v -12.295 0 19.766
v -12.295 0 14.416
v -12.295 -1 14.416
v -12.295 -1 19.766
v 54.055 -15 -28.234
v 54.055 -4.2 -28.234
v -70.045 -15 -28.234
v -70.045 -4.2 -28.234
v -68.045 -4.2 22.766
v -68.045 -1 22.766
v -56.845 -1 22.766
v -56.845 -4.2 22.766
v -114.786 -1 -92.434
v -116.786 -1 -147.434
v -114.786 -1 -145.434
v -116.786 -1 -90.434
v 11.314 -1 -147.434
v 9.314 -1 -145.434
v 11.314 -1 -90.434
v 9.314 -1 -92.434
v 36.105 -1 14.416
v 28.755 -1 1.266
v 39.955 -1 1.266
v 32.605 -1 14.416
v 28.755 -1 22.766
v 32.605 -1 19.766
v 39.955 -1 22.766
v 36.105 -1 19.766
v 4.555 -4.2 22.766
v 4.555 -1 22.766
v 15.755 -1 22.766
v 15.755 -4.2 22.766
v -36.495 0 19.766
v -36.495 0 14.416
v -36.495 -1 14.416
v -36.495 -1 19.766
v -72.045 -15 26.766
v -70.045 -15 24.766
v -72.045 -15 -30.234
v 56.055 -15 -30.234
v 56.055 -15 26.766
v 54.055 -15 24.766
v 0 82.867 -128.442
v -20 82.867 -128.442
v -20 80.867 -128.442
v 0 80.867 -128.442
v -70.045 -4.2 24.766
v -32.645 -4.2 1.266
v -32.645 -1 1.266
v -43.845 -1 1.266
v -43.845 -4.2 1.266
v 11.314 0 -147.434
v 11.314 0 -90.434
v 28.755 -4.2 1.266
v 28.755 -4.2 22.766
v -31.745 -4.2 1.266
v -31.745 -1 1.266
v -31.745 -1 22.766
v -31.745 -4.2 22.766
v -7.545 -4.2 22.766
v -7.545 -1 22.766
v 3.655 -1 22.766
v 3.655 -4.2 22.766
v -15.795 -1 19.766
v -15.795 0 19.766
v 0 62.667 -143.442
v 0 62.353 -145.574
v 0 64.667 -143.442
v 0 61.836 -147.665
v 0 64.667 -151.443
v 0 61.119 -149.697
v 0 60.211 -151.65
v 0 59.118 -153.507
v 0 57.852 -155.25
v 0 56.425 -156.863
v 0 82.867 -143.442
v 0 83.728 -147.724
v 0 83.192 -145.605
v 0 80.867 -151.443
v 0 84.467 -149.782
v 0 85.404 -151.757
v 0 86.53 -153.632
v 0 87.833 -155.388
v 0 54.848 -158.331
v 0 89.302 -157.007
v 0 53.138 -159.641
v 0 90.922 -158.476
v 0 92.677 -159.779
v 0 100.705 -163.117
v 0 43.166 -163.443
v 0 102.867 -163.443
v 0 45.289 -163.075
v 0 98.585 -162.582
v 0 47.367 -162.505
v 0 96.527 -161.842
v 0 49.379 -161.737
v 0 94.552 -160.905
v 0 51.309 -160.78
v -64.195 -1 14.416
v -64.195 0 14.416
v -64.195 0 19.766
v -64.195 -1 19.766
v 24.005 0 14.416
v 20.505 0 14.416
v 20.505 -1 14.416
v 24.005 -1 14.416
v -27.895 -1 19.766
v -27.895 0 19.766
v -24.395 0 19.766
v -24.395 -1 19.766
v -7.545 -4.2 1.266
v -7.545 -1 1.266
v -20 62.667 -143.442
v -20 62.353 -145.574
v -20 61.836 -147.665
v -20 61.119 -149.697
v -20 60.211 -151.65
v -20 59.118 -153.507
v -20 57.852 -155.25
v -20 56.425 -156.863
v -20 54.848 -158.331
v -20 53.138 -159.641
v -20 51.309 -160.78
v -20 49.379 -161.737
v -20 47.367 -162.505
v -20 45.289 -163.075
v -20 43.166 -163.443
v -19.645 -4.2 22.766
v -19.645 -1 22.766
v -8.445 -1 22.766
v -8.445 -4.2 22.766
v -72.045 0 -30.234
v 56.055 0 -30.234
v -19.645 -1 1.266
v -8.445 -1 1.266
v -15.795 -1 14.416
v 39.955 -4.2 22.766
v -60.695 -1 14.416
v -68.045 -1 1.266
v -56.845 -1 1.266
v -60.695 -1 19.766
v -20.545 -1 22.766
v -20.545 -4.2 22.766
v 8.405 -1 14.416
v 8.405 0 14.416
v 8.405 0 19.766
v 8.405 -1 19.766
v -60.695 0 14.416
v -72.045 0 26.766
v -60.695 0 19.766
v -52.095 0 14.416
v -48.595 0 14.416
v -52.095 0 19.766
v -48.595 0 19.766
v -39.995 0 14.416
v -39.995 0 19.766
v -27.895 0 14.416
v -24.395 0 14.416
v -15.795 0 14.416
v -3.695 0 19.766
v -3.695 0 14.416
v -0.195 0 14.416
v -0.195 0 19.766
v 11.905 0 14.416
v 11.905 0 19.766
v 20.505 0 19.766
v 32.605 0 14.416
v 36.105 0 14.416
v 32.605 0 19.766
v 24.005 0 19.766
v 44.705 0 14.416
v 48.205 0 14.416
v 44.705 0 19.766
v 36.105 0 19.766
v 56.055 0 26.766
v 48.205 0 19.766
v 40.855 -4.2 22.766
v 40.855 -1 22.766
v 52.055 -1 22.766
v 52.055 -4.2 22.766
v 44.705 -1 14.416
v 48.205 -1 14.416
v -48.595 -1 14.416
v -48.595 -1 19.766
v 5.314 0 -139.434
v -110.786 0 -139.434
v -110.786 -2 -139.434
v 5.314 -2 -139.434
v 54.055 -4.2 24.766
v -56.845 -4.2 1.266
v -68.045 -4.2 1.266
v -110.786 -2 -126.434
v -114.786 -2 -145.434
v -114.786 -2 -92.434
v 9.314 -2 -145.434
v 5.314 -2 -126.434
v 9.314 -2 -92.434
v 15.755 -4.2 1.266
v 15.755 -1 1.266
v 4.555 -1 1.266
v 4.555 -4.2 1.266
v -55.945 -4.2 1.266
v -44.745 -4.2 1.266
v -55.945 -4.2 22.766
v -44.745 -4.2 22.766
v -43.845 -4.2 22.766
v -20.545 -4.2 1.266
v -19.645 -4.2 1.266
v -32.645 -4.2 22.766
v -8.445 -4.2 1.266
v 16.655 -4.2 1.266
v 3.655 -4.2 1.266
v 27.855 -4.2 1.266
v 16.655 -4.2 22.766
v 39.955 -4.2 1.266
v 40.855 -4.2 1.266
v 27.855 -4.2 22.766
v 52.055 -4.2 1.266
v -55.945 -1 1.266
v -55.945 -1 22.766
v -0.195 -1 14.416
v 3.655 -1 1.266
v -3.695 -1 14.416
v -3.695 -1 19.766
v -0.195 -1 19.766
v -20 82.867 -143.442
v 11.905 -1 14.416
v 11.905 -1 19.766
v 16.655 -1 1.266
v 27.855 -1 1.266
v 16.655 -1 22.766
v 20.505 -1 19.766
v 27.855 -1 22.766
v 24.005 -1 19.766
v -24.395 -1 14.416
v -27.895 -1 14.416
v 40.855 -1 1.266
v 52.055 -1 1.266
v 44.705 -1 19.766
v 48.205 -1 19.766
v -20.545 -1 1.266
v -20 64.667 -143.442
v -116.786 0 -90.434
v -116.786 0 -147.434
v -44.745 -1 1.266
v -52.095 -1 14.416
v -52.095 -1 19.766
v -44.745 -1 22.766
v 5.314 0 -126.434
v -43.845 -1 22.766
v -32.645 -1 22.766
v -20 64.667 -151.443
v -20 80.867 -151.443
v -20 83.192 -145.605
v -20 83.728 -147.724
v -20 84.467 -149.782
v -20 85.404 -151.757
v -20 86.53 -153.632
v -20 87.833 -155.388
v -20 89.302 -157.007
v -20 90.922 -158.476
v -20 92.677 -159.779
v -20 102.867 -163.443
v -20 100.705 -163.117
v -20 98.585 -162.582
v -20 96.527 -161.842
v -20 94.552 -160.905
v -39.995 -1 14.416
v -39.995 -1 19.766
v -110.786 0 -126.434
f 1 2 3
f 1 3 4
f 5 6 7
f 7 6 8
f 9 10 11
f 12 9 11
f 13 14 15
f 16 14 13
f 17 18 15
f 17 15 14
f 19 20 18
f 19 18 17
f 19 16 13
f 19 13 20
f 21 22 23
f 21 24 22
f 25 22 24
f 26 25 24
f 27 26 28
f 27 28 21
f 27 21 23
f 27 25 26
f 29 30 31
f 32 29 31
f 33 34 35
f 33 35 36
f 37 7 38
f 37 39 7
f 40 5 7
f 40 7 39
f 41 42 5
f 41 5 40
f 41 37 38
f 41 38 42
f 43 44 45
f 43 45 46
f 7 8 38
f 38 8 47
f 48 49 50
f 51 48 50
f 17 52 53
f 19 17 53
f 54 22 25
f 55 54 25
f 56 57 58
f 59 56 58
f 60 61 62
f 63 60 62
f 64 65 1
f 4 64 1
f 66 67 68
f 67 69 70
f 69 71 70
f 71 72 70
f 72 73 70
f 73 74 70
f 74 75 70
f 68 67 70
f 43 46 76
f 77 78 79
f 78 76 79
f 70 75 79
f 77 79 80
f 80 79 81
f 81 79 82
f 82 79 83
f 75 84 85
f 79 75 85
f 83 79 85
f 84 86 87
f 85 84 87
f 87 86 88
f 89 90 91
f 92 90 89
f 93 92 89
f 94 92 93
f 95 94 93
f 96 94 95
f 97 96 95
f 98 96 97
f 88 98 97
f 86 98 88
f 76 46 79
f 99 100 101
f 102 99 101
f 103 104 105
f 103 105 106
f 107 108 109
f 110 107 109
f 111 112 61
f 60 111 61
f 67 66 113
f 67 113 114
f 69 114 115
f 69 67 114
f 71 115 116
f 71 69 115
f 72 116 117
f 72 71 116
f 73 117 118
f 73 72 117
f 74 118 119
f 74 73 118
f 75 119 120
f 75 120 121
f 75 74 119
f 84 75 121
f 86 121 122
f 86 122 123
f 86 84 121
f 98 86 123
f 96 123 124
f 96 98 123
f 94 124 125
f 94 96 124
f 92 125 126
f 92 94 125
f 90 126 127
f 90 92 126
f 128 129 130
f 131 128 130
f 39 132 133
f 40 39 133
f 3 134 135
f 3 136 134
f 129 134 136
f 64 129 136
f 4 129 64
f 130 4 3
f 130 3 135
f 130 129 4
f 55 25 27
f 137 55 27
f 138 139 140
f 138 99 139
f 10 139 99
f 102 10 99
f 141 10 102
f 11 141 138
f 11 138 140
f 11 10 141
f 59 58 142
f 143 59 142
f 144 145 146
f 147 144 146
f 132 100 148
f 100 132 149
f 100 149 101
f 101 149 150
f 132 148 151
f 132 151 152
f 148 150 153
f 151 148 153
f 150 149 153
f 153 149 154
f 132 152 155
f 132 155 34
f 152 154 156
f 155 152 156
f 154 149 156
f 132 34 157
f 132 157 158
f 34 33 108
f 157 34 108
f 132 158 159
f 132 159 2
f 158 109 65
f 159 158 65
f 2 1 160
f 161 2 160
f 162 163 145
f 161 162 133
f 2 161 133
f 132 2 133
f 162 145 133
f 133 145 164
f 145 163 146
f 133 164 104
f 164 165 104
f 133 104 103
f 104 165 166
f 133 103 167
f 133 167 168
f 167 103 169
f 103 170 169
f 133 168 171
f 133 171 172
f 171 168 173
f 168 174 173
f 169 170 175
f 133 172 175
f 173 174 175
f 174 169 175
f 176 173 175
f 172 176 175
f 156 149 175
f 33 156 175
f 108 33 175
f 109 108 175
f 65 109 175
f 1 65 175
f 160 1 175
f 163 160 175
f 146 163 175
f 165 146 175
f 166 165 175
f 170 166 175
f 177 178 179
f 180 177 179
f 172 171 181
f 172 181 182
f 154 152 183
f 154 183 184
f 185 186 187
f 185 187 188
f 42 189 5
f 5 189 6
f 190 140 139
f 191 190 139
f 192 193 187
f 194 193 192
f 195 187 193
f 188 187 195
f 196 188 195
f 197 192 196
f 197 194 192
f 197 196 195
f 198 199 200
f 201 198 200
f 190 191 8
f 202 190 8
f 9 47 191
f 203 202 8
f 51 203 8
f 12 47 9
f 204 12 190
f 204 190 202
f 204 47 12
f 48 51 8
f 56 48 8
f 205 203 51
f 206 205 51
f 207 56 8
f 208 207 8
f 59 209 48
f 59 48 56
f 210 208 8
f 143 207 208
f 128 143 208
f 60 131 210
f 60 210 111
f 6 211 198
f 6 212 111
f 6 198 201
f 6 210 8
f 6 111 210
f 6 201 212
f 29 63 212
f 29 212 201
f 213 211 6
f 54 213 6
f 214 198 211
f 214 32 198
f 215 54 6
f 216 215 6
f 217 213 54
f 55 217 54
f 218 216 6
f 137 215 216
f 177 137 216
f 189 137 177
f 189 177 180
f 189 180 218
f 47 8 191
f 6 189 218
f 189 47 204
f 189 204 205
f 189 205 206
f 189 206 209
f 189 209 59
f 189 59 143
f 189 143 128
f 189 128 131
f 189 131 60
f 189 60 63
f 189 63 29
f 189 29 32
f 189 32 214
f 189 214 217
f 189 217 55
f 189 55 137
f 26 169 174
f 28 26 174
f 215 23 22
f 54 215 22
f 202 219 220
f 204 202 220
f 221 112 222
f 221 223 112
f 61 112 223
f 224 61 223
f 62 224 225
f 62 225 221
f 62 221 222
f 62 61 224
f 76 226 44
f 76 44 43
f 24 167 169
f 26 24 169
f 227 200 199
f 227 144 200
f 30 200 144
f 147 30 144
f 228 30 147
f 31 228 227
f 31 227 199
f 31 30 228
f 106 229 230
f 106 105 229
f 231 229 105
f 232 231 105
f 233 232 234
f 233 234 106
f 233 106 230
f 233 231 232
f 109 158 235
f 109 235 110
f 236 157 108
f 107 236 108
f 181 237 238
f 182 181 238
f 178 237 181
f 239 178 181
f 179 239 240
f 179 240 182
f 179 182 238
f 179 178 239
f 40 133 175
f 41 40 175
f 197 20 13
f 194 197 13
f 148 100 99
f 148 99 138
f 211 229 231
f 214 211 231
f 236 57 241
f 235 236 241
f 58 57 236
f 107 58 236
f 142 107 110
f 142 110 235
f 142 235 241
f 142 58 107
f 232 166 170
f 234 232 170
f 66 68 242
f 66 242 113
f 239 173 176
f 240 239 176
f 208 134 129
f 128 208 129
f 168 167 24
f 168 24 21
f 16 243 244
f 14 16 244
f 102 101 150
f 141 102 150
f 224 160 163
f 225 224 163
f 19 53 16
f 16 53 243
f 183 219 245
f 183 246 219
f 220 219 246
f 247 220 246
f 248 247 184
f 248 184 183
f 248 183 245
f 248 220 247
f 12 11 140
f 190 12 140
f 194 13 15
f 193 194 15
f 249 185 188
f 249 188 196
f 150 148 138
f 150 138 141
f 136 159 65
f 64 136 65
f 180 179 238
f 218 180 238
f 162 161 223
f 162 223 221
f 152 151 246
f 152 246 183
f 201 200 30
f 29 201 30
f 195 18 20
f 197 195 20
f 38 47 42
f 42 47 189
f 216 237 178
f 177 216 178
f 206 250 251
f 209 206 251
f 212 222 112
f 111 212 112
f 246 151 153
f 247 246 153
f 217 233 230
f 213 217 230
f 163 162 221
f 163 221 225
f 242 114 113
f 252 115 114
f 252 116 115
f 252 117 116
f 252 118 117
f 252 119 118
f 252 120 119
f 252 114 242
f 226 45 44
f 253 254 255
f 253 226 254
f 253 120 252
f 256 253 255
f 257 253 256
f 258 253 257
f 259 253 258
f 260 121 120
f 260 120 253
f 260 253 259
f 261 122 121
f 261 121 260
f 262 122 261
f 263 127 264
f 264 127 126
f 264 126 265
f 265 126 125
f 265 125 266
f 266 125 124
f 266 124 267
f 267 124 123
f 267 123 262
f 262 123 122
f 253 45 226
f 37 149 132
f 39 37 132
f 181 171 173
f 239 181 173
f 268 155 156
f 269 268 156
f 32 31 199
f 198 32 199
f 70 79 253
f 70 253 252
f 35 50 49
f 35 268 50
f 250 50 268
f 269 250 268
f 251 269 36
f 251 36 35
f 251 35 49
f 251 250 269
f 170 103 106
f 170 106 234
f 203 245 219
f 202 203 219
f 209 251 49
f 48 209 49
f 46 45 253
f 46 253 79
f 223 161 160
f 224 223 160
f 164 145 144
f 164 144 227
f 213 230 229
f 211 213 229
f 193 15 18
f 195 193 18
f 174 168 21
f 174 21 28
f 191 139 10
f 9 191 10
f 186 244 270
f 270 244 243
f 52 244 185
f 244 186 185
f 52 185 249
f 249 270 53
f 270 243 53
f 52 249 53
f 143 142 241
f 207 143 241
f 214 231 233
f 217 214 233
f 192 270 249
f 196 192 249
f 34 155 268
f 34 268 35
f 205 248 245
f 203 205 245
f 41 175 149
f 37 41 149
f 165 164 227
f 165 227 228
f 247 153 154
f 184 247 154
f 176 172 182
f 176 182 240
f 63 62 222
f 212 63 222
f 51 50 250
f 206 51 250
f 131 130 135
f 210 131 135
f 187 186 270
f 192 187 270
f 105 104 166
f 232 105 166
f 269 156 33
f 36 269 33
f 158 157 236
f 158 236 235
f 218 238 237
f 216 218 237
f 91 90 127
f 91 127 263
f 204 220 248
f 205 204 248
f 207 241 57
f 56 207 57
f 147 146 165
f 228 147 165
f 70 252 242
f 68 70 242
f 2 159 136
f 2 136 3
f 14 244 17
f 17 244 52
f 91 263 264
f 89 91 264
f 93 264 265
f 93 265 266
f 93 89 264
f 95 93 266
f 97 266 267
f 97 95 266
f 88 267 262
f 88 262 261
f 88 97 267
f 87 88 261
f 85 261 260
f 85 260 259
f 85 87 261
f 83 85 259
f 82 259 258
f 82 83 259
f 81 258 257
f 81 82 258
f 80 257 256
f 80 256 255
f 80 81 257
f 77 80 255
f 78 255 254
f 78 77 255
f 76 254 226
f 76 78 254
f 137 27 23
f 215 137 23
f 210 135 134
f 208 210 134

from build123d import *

# Parameters (mm, degrees)
F1_DEPTH  = 15
F2_DEPTH  = 4.2
F0_W      = 3.5
F0_H      = 5.35
F3_DEPTH  = 1
F4_W      = 116.1
F4_H      = 13
F5_DEPTH  = 2
F6_DEPTH  = 1
F8_DEPTH  = 20
F8_FACE_W = 20
F8_FACE_H = 2
F9_DEPTH  = 15


with BuildPart() as f1:
    # F0 (on Front) → F1 (new body)
    with BuildSketch(Plane.XZ):
        Polygon((-70.045013, 26.765566), (-72.045013, 26.765566), (-72.045013, -30.234434), (56.054987, -30.234434), (56.054987, 26.765566), align=None)
        Polygon((-70.045013, -28.234434), (-70.045013, 24.765566), (-68.045013, 24.765566), (54.054987, 24.765566), (54.054987, -28.234434), align=None, mode=Mode.SUBTRACT)
    extrude(amount=F1_DEPTH)

    # F0 (on Front) → F2 (join)
    with BuildSketch(Plane.XZ):
        Polygon((-68.045013, 24.765566), (-70.045013, 24.765566), (-70.045013, -28.234434), (54.054987, -28.234434), (54.054987, 24.765566), align=None)
        Polygon((-68.045013, 1.265566), (-68.045013, 22.765566), (-64.195013, 22.765566), (-56.845013, 22.765566), (-56.845013, 1.265566), align=None, mode=Mode.SUBTRACT)
        Polygon((-55.945013, 1.265566), (-55.945013, 22.765566), (-52.095013, 22.765566), (-44.745013, 22.765566), (-44.745013, 1.265566), align=None, mode=Mode.SUBTRACT)
        Polygon((-43.845013, 1.265566), (-43.845013, 22.765566), (-39.995013, 22.765566), (-32.645013, 22.765566), (-32.645013, 1.265566), align=None, mode=Mode.SUBTRACT)
        Polygon((-31.745013, 1.265566), (-31.745013, 22.765566), (-27.895013, 22.765566), (-20.545013, 22.765566), (-20.545013, 1.265566), align=None, mode=Mode.SUBTRACT)
        Polygon((-19.645013, 1.265566), (-19.645013, 22.765566), (-15.795013, 22.765566), (-8.445013, 22.765566), (-8.445013, 1.265566), align=None, mode=Mode.SUBTRACT)
        Polygon((-7.545013, 1.265566), (-7.545013, 22.765566), (-3.695013, 22.765566), (3.654987, 22.765566), (3.654987, 1.265566), align=None, mode=Mode.SUBTRACT)
        Polygon((4.554987, 1.265566), (4.554987, 22.765566), (8.404987, 22.765566), (15.754987, 22.765566), (15.754987, 1.265566), align=None, mode=Mode.SUBTRACT)
        Polygon((16.654987, 1.265566), (16.654987, 22.765566), (20.504987, 22.765566), (27.854987, 22.765566), (27.854987, 1.265566), align=None, mode=Mode.SUBTRACT)
        Polygon((28.754987, 1.265566), (28.754987, 22.765566), (32.604987, 22.765566), (39.954987, 22.765566), (39.954987, 1.265566), align=None, mode=Mode.SUBTRACT)
        Polygon((40.854987, 1.265566), (40.854987, 22.765566), (44.704987, 22.765566), (48.788905, 22.765566), (52.054987, 22.765566), (52.054987, 1.265566), align=None, mode=Mode.SUBTRACT)
    extrude(amount=F2_DEPTH)

    # F0 (on Front) → F3 (join)
    with BuildSketch(Plane.XZ):
        Polygon((-64.195013, 22.765566), (-68.045013, 22.765566), (-68.045013, 1.265566), (-56.845013, 1.265566), (-56.845013, 22.765566), align=None)
        with Locations((-62.445013, 17.090566)):
            Rectangle(F0_W, F0_H, mode=Mode.SUBTRACT)
        Polygon((-52.095013, 22.765566), (-55.945013, 22.765566), (-55.945013, 1.265566), (-44.745013, 1.265566), (-44.745013, 22.765566), align=None)
        with Locations((-50.345013, 17.090566)):
            Rectangle(F0_W, F0_H, mode=Mode.SUBTRACT)
        Polygon((-39.995013, 22.765566), (-43.845013, 22.765566), (-43.845013, 1.265566), (-32.645013, 1.265566), (-32.645013, 22.765566), align=None)
        with Locations((-38.245013, 17.090566)):
            Rectangle(F0_W, F0_H, mode=Mode.SUBTRACT)
        Polygon((-27.895013, 22.765566), (-31.745013, 22.765566), (-31.745013, 1.265566), (-20.545013, 1.265566), (-20.545013, 22.765566), align=None)
        with Locations((-26.145013, 17.090566)):
            Rectangle(F0_W, F0_H, mode=Mode.SUBTRACT)
        Polygon((-15.795013, 22.765566), (-19.645013, 22.765566), (-19.645013, 1.265566), (-8.445013, 1.265566), (-8.445013, 22.765566), align=None)
        with Locations((-14.045013, 17.090566)):
            Rectangle(F0_W, F0_H, mode=Mode.SUBTRACT)
        Polygon((-3.695013, 22.765566), (-7.545013, 22.765566), (-7.545013, 1.265566), (3.654987, 1.265566), (3.654987, 22.765566), align=None)
        with Locations((-1.945013, 17.090566)):
            Rectangle(F0_W, F0_H, mode=Mode.SUBTRACT)
        Polygon((8.404987, 22.765566), (4.554987, 22.765566), (4.554987, 1.265566), (15.754987, 1.265566), (15.754987, 22.765566), align=None)
        with Locations((10.154987, 17.090566)):
            Rectangle(F0_W, F0_H, mode=Mode.SUBTRACT)
        Polygon((20.504987, 22.765566), (16.654987, 22.765566), (16.654987, 1.265566), (27.854987, 1.265566), (27.854987, 22.765566), align=None)
        with Locations((22.254987, 17.090566)):
            Rectangle(F0_W, F0_H, mode=Mode.SUBTRACT)
        Polygon((32.604987, 22.765566), (28.754987, 22.765566), (28.754987, 1.265566), (39.954987, 1.265566), (39.954987, 22.765566), align=None)
        with Locations((34.354987, 17.090566)):
            Rectangle(F0_W, F0_H, mode=Mode.SUBTRACT)
        Polygon((44.704987, 22.765566), (40.854987, 22.765566), (40.854987, 1.265566), (52.054987, 1.265566), (52.054987, 22.765566), (48.788905, 22.765566), align=None)
        with Locations((46.454987, 17.090566)):
            Rectangle(F0_W, F0_H, mode=Mode.SUBTRACT)
    extrude(amount=F3_DEPTH)


with BuildPart() as f5:
    # F4 (on Front) → F5 (new body)
    with BuildSketch(Plane.XZ):
        Polygon((-112.786285, -92.43428), (-114.786285, -92.43428), (-114.786285, -139.43428), (-114.786285, -145.43428), (9.313715, -145.43428), (9.313715, -92.43428), align=None)
        with Locations((-52.736285, -132.93428)):
            Rectangle(F4_W, F4_H, mode=Mode.SUBTRACT)
    extrude(amount=F5_DEPTH)

    # F4 (on Front) → F6 (join)
    with BuildSketch(Plane.XZ):
        Polygon((-114.786285, -90.43428), (-116.786285, -90.43428), (-116.786285, -147.43428), (11.313715, -147.43428), (11.313715, -90.43428), align=None)
        Polygon((-114.786285, -139.43428), (-114.786285, -92.43428), (-112.786285, -92.43428), (9.313715, -92.43428), (9.313715, -145.43428), (-114.786285, -145.43428), align=None, mode=Mode.SUBTRACT)
    extrude(amount=F6_DEPTH)


with BuildPart() as f8:
    # F7 (on Right) → F8 (new body)
    with BuildSketch(Plane.YZ):
        with BuildLine():
            Line((64.666786, -143.442418), (62.666786, -143.442418))
            ThreePointArc((62.666786, -143.442418), (56.424614, -156.862934), (43.166399, -163.442805))
            Line((43.166399, -163.442805), (63.166399, -163.442805))
            Line((63.166399, -163.442805), (82.866786, -163.442805))
            Line((82.866786, -163.442805), (102.866786, -163.442805))
            ThreePointArc((102.866786, -163.442805), (89.301976, -157.007353), (82.866786, -143.442418))
            Line((82.866786, -143.442418), (80.866786, -143.442418))
            Line((80.866786, -143.442418), (80.866786, -151.442805))
            Line((80.866786, -151.442805), (64.666786, -151.442805))
            Line((64.666786, -151.442805), (64.666786, -143.442418))
        make_face()
    extrude(amount=-F8_DEPTH)

    # F8_face (on face) → F9 (join)
    with BuildSketch(Plane(origin=(-10, 81.866786, -143.442418), x_dir=(1, 0, 0), z_dir=(0, 0, 1))):
        Rectangle(F8_FACE_W, F8_FACE_H)
    extrude(amount=F9_DEPTH)


solid = Compound([f1.part, f5.part, f8.part])
